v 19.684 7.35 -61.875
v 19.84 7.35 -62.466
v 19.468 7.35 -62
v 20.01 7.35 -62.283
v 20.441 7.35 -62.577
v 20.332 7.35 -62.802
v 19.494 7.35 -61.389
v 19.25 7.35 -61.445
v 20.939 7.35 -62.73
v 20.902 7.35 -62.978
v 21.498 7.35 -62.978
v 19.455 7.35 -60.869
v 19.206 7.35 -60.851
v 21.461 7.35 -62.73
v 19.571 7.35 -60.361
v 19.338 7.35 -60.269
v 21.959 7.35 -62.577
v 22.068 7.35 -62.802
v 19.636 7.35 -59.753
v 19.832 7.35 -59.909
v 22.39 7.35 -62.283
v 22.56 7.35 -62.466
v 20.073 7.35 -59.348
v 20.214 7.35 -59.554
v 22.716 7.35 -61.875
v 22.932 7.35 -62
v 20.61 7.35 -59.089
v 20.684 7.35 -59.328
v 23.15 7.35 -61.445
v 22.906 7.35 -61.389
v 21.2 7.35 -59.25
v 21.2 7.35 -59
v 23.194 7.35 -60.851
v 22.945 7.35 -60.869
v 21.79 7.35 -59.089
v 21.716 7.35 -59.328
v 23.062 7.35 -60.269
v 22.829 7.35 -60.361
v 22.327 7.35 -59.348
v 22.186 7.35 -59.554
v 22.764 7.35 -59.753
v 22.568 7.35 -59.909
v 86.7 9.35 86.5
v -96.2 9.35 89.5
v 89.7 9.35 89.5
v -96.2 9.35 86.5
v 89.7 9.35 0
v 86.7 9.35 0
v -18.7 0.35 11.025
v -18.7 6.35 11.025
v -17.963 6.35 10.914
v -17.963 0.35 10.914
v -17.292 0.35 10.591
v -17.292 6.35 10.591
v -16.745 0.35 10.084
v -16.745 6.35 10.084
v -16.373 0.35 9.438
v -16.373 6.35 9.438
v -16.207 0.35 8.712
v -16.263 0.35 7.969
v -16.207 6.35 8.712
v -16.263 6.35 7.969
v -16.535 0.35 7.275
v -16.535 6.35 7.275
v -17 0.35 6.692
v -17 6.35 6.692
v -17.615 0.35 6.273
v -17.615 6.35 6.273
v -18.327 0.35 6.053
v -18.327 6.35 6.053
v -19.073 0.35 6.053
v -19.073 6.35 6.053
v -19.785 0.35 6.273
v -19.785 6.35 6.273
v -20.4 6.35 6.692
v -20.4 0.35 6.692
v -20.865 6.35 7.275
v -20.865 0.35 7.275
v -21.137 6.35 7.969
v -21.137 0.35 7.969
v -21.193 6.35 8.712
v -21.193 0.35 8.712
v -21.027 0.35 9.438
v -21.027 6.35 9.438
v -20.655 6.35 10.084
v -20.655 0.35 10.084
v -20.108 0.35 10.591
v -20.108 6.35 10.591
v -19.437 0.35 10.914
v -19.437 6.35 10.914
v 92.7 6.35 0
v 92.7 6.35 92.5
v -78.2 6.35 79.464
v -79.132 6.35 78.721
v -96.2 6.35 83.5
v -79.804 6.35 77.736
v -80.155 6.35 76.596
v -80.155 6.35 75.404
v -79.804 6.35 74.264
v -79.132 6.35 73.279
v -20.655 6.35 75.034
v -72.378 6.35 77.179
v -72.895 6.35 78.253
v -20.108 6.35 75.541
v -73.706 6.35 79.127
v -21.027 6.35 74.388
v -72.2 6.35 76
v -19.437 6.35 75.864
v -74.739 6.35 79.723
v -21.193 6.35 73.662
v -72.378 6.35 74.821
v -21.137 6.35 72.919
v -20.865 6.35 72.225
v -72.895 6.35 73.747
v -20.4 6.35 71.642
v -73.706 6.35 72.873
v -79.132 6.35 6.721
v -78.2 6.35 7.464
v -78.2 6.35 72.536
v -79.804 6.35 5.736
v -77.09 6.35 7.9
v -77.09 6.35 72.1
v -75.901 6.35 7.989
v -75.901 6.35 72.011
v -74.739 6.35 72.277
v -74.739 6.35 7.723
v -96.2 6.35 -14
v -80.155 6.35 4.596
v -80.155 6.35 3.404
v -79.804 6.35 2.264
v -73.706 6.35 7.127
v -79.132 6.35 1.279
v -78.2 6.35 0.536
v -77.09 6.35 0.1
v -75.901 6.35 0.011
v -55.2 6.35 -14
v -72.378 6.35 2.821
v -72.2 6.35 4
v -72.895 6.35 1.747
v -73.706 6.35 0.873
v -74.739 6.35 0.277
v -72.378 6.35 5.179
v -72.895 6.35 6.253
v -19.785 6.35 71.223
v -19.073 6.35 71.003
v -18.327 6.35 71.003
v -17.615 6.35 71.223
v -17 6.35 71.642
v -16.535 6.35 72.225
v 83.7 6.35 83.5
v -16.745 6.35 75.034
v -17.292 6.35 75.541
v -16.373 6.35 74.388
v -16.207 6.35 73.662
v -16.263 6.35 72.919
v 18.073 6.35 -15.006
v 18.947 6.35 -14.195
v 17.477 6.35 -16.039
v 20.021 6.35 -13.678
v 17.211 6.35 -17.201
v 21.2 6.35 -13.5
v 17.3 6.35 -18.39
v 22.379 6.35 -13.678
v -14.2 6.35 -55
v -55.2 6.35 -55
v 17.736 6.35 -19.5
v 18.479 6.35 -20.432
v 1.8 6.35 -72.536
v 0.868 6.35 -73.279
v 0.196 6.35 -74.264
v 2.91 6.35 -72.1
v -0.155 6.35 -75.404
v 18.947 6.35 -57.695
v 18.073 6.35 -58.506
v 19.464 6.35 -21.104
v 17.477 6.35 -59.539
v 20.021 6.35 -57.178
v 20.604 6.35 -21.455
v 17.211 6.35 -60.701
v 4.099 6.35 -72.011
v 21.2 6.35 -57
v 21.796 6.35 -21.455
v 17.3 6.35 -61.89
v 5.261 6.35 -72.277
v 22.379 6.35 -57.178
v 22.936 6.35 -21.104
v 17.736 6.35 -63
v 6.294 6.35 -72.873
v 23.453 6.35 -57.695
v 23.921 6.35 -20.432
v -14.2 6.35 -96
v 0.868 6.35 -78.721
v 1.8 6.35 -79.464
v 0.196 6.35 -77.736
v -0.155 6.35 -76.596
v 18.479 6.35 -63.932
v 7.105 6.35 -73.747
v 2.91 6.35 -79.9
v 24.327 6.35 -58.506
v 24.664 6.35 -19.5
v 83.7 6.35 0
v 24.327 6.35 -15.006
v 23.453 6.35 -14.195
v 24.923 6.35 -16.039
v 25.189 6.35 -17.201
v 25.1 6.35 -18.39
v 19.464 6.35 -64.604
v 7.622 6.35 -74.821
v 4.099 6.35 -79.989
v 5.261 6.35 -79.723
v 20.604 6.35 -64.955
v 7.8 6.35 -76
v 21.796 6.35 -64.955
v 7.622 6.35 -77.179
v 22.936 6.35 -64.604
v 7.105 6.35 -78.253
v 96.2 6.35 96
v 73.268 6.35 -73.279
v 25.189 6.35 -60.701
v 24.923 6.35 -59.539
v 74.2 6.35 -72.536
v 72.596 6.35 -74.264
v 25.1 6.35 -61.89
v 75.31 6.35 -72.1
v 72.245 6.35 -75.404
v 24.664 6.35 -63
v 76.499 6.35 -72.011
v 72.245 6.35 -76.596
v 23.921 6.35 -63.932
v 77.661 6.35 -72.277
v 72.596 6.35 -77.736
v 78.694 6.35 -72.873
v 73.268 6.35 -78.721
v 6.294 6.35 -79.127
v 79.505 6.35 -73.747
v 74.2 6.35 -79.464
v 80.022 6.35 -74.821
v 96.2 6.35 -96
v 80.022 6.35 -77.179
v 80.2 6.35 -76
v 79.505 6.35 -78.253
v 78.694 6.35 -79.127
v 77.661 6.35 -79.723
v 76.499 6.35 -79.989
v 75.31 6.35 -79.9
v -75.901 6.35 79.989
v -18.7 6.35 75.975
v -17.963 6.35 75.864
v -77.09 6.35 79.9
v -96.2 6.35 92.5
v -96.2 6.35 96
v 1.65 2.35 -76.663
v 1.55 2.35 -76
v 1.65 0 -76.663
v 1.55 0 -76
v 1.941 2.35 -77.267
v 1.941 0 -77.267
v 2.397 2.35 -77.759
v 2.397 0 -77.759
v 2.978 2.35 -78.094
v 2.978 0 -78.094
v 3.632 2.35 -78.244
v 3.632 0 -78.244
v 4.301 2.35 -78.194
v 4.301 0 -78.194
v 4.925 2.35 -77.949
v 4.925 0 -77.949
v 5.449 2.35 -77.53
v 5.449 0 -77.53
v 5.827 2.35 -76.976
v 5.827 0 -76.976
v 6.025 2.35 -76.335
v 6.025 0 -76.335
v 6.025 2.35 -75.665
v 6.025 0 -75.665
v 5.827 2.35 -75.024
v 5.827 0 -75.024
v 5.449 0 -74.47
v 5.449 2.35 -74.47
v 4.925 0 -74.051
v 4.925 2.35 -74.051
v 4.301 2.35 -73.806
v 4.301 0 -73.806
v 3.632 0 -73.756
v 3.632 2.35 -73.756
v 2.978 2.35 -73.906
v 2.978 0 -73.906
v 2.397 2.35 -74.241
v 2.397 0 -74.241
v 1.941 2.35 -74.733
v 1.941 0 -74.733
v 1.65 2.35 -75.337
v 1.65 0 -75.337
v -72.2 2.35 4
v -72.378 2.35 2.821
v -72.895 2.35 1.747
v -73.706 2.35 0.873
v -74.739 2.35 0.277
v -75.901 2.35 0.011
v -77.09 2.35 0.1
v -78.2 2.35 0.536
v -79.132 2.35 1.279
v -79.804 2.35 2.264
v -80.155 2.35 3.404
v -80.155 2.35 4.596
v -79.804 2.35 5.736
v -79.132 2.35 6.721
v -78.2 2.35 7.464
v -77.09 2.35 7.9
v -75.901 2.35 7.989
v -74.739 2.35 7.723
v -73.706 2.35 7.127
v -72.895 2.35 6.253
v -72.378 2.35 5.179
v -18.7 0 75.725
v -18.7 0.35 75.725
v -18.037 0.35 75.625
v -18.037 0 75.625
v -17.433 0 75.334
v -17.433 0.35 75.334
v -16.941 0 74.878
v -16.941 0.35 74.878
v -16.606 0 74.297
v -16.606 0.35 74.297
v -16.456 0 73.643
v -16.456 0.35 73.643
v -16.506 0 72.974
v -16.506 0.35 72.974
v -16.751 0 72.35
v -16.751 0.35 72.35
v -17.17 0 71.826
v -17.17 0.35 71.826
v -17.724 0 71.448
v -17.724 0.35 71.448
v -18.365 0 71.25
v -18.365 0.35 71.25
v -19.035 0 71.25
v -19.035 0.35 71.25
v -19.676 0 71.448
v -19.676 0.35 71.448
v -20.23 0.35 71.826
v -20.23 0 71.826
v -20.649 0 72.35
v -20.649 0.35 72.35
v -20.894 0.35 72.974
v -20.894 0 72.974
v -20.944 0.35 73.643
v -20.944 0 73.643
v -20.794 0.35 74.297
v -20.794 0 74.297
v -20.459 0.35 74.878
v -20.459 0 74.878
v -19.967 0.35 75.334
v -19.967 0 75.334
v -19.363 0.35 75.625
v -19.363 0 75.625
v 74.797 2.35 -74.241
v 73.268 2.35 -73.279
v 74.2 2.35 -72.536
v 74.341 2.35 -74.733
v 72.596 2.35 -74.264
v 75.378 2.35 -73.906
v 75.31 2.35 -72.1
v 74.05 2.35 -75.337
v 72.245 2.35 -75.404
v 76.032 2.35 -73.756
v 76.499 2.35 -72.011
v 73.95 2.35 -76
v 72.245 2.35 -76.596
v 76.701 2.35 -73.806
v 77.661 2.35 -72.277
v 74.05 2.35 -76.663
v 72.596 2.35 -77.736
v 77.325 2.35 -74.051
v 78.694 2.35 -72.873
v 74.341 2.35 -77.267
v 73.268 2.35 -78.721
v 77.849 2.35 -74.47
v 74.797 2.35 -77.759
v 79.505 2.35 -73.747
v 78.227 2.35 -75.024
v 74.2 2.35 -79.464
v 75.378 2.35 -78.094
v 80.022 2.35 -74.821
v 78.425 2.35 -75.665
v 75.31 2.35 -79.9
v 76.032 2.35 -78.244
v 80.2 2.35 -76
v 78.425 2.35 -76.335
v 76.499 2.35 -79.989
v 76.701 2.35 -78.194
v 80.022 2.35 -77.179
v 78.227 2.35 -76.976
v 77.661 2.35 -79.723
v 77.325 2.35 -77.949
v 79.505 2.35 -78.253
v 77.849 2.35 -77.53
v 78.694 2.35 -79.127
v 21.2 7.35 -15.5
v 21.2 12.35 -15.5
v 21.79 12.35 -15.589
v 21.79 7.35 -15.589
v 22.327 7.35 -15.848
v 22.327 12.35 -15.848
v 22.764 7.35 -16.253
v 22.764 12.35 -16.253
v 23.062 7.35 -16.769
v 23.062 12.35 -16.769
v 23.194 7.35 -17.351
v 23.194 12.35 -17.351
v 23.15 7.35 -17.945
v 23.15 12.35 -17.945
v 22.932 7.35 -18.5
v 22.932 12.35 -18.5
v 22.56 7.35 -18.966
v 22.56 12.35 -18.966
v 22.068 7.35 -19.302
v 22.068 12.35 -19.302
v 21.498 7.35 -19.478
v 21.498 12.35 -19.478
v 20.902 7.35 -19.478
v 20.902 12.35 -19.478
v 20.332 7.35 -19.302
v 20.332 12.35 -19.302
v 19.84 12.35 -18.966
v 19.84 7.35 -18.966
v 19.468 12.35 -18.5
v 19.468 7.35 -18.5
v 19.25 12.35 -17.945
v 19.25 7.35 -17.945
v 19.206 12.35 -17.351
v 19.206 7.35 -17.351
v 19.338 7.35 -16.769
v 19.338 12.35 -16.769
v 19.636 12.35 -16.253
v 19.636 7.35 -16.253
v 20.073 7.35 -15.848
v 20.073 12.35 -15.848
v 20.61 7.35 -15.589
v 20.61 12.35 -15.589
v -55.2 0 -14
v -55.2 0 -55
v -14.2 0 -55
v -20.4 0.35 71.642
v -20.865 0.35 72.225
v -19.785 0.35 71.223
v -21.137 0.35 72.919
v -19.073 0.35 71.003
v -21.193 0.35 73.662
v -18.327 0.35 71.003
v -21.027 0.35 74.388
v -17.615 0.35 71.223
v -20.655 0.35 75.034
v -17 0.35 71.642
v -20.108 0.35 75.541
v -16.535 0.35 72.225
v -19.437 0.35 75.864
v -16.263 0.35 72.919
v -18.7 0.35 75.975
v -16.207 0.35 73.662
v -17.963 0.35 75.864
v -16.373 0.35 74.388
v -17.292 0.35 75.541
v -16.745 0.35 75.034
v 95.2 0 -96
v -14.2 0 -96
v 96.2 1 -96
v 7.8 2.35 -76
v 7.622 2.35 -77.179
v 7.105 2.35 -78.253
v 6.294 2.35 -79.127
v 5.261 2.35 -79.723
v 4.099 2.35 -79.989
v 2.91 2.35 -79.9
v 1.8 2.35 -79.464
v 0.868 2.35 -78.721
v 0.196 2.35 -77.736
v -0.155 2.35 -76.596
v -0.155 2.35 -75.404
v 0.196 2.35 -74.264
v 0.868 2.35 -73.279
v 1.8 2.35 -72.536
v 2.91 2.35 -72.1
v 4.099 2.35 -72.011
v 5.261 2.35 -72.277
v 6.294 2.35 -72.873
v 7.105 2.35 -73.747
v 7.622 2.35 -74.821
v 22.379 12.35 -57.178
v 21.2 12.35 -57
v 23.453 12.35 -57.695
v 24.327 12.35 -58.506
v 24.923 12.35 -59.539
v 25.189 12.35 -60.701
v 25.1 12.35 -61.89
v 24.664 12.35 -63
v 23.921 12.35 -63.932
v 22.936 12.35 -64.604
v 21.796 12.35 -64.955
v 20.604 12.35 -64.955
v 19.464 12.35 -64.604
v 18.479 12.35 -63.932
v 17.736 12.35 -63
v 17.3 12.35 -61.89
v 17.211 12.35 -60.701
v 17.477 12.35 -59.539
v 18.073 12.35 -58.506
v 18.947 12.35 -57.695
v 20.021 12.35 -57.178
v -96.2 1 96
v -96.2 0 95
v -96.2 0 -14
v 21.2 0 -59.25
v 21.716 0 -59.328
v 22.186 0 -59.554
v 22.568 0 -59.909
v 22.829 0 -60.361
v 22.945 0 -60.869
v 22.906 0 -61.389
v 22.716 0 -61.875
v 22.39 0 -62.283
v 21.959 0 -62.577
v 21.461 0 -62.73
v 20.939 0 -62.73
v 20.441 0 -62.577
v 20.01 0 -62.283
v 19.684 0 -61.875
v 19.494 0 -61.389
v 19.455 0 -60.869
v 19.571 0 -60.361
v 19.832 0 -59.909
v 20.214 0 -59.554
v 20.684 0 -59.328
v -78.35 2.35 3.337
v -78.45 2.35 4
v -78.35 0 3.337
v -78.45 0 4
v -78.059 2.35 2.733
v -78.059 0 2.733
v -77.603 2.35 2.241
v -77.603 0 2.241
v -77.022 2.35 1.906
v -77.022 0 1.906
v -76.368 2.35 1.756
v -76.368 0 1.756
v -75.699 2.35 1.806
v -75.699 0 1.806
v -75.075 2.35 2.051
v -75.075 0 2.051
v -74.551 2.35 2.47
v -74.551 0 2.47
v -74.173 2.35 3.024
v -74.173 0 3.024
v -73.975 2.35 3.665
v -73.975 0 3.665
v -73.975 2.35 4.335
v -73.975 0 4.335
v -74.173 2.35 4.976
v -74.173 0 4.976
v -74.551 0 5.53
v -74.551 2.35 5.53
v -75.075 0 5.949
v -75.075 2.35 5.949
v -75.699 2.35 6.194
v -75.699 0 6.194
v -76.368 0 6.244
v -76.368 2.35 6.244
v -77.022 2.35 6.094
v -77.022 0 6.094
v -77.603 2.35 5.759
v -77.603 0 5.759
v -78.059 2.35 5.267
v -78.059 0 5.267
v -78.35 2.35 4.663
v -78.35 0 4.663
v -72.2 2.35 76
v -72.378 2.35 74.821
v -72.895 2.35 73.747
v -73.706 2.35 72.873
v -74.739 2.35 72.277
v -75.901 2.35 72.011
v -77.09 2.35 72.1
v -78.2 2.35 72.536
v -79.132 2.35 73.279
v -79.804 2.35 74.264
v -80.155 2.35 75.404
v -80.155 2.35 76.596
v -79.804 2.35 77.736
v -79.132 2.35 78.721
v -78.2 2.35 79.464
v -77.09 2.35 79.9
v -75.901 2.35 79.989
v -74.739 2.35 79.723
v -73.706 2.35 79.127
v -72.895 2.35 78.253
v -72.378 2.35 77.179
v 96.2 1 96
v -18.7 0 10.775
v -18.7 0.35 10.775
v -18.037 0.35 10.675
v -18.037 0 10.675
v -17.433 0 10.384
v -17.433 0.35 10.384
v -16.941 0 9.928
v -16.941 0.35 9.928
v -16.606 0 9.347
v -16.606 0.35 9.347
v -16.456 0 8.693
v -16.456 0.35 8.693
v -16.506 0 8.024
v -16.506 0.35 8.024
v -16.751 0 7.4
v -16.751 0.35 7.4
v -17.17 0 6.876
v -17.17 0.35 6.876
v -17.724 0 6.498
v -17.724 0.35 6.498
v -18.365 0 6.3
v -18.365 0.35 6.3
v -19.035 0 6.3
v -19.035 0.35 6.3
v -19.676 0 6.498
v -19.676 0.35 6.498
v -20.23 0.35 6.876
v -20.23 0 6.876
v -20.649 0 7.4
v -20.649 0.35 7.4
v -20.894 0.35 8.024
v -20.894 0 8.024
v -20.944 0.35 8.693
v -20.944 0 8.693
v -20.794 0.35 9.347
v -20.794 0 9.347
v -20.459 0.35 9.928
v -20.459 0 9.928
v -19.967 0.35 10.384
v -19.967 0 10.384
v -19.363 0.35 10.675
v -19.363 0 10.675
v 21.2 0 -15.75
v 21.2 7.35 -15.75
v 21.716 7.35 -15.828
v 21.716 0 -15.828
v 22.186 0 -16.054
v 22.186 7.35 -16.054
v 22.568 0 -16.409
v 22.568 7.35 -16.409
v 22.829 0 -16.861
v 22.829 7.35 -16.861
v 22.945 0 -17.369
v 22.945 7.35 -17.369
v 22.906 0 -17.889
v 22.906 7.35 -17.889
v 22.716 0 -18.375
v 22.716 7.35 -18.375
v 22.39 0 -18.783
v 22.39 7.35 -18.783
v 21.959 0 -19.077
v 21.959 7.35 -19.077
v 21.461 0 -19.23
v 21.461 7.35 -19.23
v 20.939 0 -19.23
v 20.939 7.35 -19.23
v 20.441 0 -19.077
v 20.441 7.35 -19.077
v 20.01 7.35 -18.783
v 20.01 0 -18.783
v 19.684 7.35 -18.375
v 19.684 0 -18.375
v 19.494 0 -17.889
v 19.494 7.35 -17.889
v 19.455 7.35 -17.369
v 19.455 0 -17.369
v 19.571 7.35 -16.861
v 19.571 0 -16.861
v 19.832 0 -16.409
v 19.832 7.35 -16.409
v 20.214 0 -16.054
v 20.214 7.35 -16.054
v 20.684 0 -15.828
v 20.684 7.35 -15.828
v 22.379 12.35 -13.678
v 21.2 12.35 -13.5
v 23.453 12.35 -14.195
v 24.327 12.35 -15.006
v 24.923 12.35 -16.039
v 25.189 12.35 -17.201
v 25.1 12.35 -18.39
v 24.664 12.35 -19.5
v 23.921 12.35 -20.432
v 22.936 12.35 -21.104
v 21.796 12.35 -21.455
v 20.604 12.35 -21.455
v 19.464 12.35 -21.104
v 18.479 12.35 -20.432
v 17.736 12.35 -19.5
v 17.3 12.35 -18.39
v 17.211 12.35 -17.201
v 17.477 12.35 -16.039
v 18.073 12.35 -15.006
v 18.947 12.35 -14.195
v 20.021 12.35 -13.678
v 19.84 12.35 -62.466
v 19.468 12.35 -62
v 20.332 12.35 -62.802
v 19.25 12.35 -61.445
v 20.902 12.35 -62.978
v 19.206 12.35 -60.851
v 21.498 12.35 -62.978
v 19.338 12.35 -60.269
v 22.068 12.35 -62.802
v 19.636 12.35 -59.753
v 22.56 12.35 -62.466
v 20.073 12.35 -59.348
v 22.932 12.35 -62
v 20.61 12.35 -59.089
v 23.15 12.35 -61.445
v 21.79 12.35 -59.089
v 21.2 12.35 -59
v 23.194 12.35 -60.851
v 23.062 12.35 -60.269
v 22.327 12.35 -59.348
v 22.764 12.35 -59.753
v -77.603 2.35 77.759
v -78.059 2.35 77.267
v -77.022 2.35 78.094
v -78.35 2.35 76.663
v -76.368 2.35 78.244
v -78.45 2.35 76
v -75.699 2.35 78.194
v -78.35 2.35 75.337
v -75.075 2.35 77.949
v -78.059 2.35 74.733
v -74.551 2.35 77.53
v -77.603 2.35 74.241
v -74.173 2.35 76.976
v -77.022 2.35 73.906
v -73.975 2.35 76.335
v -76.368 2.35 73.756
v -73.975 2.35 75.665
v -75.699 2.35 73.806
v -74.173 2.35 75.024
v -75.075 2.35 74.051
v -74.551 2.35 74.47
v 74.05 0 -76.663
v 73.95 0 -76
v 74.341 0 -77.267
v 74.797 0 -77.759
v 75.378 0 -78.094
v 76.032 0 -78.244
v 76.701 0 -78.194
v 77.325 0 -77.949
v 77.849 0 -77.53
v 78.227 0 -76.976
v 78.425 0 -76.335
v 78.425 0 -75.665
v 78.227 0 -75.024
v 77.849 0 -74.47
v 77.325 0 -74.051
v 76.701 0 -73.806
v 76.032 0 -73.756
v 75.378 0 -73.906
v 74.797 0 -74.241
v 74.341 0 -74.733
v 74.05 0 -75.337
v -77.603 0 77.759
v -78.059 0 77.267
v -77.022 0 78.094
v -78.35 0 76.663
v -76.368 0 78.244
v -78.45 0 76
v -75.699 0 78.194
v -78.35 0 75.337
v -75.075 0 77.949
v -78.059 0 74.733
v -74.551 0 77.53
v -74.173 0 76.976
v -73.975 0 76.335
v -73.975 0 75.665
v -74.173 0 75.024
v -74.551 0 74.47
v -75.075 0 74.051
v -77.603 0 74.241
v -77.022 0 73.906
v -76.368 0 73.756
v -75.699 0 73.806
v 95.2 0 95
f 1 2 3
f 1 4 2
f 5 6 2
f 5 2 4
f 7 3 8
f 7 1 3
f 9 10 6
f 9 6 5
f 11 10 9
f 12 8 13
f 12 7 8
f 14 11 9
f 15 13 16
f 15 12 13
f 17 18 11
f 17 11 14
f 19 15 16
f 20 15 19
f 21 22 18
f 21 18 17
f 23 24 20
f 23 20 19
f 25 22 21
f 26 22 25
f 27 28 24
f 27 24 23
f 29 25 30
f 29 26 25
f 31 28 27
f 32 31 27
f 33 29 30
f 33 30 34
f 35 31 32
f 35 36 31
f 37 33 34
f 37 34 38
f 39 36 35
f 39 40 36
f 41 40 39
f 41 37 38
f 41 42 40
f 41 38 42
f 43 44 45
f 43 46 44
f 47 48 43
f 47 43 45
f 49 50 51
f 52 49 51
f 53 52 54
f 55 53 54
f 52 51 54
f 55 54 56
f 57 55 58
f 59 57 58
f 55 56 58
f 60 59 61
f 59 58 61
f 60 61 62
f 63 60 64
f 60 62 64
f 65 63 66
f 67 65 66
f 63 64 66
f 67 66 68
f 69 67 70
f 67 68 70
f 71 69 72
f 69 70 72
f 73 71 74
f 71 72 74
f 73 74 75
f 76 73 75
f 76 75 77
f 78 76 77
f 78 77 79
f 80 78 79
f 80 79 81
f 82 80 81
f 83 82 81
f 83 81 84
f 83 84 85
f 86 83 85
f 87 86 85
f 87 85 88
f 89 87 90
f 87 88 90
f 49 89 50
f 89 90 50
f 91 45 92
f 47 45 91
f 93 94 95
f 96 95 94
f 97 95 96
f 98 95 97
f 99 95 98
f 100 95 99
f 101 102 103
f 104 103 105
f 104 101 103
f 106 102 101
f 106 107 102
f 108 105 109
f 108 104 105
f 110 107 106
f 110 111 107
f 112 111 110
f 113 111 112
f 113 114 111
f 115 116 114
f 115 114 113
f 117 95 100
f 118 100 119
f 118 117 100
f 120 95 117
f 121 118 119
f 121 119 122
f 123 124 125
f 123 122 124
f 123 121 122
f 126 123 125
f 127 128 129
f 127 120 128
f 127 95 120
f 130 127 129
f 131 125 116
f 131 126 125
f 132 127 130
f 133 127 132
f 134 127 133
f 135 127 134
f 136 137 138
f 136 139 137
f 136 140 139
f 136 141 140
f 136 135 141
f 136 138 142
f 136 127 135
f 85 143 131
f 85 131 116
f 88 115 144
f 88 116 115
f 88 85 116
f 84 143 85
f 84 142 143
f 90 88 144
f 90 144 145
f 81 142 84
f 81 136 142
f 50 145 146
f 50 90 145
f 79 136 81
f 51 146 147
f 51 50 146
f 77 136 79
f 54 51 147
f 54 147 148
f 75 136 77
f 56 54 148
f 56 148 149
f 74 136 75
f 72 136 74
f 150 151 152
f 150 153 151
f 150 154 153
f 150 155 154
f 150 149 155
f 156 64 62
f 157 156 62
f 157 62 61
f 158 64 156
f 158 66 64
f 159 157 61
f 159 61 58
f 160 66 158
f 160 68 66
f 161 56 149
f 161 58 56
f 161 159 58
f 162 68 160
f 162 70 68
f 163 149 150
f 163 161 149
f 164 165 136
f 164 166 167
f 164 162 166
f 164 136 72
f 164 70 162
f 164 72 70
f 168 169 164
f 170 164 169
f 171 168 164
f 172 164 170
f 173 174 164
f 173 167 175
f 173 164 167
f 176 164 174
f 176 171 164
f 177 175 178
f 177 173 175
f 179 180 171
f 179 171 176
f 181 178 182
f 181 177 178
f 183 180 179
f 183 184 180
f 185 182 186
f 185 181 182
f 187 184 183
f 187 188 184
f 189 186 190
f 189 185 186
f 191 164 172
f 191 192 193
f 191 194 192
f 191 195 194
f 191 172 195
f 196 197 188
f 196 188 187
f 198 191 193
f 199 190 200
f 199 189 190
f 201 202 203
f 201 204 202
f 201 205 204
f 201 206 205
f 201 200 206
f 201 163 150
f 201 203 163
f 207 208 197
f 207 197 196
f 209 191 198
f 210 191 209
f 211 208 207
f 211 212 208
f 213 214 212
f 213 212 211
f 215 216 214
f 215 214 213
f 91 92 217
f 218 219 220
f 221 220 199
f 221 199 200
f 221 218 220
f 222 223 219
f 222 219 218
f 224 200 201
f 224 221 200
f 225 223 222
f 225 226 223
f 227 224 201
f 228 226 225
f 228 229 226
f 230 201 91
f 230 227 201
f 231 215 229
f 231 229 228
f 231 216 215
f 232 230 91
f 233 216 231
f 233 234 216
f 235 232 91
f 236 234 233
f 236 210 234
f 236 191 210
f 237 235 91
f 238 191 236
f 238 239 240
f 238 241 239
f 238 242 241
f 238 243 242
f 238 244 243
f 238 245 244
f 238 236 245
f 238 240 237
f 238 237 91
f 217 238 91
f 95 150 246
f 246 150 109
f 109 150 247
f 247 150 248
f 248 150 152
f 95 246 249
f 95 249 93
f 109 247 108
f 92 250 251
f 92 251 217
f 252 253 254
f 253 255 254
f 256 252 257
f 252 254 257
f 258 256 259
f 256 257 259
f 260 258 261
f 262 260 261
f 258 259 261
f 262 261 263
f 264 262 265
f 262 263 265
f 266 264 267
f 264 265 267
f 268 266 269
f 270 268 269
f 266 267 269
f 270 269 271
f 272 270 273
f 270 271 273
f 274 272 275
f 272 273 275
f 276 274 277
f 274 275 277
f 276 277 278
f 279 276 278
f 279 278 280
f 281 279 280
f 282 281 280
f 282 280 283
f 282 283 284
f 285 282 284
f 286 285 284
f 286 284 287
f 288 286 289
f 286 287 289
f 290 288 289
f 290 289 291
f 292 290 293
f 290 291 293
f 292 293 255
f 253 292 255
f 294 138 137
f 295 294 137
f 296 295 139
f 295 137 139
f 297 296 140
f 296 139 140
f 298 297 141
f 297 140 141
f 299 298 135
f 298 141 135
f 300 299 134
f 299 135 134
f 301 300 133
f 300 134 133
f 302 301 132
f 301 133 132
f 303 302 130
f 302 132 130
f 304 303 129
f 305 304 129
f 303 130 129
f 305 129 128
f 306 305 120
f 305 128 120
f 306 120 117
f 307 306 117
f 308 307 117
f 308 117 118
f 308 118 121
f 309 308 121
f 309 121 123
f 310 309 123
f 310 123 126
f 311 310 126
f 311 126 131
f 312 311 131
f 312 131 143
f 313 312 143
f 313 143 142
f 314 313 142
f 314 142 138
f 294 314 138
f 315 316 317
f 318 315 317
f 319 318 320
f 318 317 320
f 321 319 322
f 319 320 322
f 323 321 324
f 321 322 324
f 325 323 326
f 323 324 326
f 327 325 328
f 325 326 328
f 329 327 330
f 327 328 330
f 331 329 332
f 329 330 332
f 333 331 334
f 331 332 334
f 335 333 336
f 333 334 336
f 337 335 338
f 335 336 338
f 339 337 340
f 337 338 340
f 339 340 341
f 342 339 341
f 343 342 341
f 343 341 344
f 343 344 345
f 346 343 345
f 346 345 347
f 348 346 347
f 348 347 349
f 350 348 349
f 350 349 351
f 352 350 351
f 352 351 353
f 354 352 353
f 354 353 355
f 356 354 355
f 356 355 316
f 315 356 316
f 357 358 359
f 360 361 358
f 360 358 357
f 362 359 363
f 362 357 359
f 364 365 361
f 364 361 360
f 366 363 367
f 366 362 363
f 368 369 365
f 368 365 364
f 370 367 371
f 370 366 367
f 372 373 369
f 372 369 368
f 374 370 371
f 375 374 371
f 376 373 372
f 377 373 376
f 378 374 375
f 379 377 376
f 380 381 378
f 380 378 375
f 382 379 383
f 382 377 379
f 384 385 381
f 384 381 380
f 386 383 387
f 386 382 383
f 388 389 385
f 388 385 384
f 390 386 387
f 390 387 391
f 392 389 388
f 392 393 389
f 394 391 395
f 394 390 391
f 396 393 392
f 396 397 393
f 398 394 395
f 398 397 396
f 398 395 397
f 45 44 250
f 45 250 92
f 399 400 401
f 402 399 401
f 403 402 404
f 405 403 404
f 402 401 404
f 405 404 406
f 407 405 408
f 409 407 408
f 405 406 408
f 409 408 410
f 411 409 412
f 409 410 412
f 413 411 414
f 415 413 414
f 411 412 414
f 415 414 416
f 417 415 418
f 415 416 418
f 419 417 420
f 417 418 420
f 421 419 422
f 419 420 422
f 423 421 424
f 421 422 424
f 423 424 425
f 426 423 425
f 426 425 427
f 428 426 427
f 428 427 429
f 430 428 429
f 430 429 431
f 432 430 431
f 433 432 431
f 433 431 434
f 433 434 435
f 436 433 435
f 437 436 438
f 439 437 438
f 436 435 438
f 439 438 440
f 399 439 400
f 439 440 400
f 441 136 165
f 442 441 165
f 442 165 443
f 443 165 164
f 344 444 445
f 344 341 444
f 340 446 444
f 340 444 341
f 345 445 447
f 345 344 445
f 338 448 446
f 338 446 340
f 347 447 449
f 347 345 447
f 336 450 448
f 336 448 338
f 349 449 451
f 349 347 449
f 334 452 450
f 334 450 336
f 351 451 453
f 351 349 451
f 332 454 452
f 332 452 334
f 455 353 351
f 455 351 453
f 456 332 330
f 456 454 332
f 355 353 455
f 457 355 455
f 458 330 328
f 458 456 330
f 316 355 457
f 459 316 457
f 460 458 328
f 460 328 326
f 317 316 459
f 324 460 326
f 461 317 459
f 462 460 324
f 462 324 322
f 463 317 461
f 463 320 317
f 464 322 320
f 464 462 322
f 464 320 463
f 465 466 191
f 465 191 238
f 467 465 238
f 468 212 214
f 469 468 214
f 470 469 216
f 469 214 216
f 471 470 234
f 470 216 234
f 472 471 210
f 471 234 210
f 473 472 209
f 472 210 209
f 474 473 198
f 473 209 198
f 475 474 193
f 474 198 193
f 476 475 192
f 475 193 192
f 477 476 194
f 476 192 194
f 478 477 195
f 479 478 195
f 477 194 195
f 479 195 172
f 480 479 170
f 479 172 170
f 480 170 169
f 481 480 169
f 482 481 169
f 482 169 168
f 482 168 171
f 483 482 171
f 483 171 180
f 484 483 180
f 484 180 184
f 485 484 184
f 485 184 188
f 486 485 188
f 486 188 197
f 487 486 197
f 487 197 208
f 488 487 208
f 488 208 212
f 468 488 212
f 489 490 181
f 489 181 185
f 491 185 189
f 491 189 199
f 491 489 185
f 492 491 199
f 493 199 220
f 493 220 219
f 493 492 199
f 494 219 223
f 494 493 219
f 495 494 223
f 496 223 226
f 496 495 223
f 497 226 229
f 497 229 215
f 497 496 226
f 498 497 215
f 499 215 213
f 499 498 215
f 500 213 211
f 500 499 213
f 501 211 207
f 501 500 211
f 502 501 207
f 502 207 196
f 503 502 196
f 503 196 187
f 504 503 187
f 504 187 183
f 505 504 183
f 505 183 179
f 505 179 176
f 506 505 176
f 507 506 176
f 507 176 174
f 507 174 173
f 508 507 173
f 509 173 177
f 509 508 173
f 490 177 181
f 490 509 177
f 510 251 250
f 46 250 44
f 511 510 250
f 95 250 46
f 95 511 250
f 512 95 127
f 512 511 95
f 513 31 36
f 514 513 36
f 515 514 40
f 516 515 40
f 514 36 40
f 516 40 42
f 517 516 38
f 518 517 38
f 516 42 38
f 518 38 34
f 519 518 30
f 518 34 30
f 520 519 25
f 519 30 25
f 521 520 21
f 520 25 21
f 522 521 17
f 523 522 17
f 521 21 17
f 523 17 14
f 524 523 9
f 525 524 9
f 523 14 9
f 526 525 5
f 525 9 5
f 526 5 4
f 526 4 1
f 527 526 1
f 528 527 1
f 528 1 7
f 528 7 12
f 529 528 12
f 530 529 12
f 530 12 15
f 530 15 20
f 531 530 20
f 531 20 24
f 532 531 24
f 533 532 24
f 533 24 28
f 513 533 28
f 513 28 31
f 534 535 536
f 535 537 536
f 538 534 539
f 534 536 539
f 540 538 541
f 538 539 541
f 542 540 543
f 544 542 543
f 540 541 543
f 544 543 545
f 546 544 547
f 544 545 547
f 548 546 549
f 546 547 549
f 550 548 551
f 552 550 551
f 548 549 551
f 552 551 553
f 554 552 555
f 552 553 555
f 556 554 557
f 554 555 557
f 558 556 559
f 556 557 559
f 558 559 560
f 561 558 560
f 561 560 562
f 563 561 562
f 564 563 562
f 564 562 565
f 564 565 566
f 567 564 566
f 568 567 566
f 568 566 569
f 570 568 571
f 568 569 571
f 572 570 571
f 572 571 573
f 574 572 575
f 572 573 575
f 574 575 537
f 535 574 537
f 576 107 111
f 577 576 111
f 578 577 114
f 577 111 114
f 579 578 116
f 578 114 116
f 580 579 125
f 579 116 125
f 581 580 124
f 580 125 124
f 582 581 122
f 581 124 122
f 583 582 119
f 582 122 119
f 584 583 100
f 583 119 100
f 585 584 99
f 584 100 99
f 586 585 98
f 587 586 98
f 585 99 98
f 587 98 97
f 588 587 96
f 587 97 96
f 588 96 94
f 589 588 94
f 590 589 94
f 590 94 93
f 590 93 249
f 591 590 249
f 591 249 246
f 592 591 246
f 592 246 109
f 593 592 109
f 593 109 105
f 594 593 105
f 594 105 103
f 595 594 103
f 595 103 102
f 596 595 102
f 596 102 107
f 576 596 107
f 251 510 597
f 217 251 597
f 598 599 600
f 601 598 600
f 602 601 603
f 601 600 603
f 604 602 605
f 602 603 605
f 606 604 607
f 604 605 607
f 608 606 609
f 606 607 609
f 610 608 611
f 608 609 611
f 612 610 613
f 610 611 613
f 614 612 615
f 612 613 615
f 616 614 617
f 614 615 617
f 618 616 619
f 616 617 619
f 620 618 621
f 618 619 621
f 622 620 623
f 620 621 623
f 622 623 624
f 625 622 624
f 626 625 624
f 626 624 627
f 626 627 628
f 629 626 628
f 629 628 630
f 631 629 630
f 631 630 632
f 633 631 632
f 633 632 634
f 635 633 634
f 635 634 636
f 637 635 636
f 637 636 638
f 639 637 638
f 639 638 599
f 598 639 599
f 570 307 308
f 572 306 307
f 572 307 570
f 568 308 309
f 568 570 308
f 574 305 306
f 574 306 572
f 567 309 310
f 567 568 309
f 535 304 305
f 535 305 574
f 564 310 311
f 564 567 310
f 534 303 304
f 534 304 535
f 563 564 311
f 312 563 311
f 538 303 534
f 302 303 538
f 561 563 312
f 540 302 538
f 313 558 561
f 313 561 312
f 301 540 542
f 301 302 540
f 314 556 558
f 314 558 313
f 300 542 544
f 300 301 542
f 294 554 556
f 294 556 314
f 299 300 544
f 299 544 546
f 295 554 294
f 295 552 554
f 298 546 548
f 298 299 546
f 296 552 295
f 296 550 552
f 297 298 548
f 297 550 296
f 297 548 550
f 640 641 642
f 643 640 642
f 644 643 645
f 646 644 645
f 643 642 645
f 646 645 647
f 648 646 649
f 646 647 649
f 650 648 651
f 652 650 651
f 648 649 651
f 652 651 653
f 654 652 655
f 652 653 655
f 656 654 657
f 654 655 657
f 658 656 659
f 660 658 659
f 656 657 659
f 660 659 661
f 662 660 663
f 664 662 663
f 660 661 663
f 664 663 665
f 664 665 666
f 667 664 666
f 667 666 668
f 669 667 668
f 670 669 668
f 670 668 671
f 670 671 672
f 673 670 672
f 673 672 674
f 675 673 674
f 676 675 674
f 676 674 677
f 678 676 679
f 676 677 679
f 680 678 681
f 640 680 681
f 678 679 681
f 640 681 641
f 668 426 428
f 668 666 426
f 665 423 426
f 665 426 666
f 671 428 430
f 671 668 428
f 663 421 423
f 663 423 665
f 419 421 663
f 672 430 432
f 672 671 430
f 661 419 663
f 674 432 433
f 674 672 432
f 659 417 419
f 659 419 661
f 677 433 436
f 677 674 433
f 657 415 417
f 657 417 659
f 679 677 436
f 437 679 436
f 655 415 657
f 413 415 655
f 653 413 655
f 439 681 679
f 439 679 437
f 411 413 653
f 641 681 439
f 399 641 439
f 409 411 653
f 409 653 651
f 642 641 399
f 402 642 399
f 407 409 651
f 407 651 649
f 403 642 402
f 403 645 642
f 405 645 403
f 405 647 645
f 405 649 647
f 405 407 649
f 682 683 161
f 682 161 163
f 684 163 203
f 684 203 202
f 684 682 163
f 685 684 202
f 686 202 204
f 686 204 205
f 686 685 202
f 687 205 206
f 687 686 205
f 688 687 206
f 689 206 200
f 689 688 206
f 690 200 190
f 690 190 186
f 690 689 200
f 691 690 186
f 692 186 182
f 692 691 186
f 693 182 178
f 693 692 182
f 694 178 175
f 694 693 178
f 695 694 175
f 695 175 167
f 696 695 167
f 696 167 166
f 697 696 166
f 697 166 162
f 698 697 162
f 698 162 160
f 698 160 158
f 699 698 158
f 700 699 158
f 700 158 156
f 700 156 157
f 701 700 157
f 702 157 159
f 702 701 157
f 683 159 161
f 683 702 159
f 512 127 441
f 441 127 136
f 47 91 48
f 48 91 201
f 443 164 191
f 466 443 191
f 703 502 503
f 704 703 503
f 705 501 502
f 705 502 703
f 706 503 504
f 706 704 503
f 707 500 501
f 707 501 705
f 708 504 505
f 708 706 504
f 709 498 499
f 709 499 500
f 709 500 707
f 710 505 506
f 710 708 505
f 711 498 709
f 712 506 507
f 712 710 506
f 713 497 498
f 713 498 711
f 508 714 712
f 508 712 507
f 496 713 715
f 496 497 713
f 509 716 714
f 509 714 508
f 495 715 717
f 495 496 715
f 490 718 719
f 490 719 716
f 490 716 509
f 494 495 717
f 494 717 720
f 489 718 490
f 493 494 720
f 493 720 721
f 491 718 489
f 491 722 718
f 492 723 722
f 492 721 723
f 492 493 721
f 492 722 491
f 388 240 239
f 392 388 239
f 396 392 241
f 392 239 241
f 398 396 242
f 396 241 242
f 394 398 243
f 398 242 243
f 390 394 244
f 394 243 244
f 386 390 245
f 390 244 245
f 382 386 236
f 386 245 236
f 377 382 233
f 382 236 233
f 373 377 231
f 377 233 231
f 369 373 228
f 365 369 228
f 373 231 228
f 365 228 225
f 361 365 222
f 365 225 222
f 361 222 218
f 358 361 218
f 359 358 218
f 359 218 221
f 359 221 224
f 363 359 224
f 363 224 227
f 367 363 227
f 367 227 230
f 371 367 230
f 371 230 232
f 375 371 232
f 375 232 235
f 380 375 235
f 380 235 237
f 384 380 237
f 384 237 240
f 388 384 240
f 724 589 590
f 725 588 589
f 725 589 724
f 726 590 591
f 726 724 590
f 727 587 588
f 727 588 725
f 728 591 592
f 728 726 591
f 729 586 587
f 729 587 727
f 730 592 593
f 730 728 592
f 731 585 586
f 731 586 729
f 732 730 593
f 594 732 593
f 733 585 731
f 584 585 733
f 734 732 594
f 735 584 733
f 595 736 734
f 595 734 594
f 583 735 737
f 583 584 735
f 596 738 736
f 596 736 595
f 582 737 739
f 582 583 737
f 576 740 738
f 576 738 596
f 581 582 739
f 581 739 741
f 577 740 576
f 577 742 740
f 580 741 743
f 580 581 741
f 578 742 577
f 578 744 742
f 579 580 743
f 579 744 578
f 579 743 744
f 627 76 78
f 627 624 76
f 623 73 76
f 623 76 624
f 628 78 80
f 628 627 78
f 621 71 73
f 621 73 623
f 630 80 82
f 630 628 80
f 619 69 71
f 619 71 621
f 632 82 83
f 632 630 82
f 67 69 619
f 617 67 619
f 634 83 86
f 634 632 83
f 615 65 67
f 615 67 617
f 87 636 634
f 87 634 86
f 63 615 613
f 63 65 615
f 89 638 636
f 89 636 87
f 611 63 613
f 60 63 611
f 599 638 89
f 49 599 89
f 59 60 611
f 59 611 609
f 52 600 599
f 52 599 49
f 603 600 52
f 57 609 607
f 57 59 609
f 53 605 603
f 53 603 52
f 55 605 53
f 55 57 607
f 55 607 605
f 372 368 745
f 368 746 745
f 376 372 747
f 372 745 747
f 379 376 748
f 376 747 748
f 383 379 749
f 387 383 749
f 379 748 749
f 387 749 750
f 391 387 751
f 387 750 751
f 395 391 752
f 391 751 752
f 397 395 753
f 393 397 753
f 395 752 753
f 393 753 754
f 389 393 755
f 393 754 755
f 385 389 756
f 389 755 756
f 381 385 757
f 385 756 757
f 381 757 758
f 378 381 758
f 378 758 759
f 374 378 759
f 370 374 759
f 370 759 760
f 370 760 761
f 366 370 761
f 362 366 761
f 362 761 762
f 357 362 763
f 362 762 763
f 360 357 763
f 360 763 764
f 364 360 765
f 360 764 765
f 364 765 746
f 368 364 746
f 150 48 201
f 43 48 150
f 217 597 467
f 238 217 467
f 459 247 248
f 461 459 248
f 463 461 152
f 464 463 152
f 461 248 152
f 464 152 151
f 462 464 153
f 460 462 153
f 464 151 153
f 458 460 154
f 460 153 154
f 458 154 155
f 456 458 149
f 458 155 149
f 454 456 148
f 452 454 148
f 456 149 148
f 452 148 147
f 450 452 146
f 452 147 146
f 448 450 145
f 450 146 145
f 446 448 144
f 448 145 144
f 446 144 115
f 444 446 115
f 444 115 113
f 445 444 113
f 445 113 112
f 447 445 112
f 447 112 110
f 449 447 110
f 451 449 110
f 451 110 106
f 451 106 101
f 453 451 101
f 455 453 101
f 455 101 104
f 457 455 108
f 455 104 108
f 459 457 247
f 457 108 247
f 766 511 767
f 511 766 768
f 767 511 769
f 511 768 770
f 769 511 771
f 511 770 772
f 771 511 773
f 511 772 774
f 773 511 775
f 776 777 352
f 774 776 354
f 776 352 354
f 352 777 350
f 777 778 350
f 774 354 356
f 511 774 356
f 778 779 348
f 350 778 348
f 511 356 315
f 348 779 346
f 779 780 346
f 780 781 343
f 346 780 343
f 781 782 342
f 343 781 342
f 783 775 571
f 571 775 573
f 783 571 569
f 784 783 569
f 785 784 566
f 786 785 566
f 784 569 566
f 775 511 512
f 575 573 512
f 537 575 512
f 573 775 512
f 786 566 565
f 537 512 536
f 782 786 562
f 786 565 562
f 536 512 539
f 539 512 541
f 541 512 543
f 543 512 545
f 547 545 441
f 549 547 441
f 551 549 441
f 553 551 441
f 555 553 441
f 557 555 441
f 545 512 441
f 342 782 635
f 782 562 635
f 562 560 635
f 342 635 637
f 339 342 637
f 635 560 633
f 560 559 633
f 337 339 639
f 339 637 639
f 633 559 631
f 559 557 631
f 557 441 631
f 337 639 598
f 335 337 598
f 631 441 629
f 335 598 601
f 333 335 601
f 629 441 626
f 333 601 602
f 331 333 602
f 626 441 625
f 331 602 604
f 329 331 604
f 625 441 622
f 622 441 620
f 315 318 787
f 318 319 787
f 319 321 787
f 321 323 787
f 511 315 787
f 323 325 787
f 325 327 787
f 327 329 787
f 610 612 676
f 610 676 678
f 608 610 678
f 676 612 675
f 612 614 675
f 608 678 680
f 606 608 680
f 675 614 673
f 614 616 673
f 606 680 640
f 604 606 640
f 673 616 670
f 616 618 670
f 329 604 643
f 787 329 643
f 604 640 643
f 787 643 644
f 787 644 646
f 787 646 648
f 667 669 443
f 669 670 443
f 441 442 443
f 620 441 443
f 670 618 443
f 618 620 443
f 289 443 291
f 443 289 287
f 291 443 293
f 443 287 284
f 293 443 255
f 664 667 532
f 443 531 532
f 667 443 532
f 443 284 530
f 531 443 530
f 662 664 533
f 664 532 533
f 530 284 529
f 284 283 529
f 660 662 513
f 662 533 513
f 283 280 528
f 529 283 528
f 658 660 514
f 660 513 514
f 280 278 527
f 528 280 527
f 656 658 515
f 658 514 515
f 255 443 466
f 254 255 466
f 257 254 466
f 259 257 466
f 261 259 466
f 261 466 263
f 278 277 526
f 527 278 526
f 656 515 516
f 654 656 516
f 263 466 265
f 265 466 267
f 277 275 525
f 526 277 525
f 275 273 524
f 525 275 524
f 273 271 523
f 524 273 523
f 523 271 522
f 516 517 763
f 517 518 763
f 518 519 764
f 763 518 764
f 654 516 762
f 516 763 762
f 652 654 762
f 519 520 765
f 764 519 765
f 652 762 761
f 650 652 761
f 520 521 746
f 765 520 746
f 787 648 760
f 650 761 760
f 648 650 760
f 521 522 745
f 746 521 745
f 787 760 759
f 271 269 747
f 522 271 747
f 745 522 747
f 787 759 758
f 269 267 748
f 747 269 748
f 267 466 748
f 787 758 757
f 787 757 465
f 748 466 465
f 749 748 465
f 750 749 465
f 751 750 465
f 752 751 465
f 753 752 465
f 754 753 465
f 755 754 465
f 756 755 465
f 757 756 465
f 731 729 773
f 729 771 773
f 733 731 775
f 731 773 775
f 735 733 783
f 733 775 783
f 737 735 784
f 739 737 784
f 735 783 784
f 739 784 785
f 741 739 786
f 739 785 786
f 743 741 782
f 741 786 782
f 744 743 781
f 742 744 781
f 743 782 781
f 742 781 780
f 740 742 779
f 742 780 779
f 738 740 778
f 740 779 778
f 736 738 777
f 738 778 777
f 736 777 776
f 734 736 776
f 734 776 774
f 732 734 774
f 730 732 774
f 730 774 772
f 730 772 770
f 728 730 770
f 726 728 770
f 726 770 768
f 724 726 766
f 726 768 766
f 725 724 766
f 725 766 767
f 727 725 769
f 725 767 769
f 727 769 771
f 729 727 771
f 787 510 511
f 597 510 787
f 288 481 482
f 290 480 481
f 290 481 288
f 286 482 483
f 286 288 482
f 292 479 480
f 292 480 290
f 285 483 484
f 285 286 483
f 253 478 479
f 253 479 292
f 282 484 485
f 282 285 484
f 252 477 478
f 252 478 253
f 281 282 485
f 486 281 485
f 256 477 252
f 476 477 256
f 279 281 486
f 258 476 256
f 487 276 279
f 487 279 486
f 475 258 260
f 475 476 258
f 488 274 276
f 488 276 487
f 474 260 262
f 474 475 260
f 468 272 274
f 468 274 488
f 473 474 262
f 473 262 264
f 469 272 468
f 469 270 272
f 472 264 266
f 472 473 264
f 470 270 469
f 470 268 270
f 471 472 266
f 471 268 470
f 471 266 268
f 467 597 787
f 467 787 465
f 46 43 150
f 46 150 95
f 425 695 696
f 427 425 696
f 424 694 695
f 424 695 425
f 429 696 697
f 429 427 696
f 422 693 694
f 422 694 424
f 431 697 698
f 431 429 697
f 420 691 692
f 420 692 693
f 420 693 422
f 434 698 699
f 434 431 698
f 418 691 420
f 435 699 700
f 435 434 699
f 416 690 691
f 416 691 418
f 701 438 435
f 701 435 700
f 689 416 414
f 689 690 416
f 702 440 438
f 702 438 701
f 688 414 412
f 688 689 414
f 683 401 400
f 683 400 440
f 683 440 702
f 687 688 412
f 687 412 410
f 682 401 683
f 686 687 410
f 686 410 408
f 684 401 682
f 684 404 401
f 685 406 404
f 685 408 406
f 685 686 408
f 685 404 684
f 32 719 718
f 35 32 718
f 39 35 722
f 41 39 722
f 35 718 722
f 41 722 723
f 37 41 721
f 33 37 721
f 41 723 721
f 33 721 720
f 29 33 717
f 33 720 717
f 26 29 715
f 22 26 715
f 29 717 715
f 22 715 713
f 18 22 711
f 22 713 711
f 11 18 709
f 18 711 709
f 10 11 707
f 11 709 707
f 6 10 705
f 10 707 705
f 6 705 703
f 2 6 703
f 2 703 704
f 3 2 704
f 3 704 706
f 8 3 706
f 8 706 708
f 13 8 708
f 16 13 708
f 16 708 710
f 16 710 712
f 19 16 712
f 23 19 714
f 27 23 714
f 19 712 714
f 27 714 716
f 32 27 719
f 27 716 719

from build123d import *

# Parameters (mm, degrees)
SKETCH1_W                      = 192.4
SKETCH1_H                      = 192
BOSS_EXTRUDE1_DEPTH            = 6.35
CUT_EXTRUDE1_REACH             = 138.054
SKETCH2_W                      = 41
SKETCH2_H                      = 41
CBORE_FOR_M4_SHCS1_D           = 4.5
CBORE_FOR_M4_SHCS1_CBORE_D     = 8
CBORE_FOR_M4_SHCS1_CBORE_DEPTH = 4
SKETCH5_R                      = 2.5
CUT_EXTRUDE2_DEPTH             = 6
CUT_EXTRUDE3_REACH             = 138.038
SKETCH6_R                      = 2.25
CUT_EXTRUDE4_REACH             = 138.054
SKETCH7_R                      = 1.75
BOSS_EXTRUDE2_START            = 6
SKETCH11_R                     = 4
SKETCH11_R_2                   = 1.75
BOSS_EXTRUDE2_DEPTH            = 6
SKETCH8_R                      = 2
CUT_EXTRUDE5_DEPTH             = 5
EXTRUDE_THIN1_DEPTH            = 3
CHAMFER1_SIZE                  = 3
CHAMFER2_SIZE                  = 1


with BuildPart() as part:
    # Sketch1 → Boss-Extrude1 (new body)
    with BuildSketch(Plane(origin=(0, 0, 0), x_dir=(1, 0, 0), z_dir=(0, 1, 0))):
        Rectangle(SKETCH1_W, SKETCH1_H)
    extrude(amount=BOSS_EXTRUDE1_DEPTH)

    # Sketch2 → Cut-Extrude1 (cut, up to next)
    with BuildSketch(Plane(origin=(0, 6.35, 0), x_dir=(1, 0, 0), z_dir=(0, 1, 0)), mode=Mode.PRIVATE) as cut_extrude1_sk1:
        with Locations((-75.7, 34.5)):
            Rectangle(SKETCH2_W, SKETCH2_H)
    cut_extrude1_tool1 = extrude(cut_extrude1_sk1.sketch, amount=-CUT_EXTRUDE1_REACH, mode=Mode.PRIVATE) & part.part
    # Sketch2 → Cut-Extrude1 (cut, up to next)
    with BuildSketch(Plane(origin=(0, 6.35, 0), x_dir=(1, 0, 0), z_dir=(0, 1, 0)), mode=Mode.PRIVATE) as cut_extrude1_sk2:
        with Locations((-75.7, 75.5)):
            Rectangle(SKETCH2_W, SKETCH2_H)
    cut_extrude1_tool2 = extrude(cut_extrude1_sk2.sketch, amount=-CUT_EXTRUDE1_REACH, mode=Mode.PRIVATE) & part.part
    # Sketch2 → Cut-Extrude1 (cut, up to next)
    with BuildSketch(Plane(origin=(0, 6.35, 0), x_dir=(1, 0, 0), z_dir=(0, 1, 0)), mode=Mode.PRIVATE) as cut_extrude1_sk3:
        with Locations((-34.7, 75.5)):
            Rectangle(SKETCH2_W, SKETCH2_H)
    cut_extrude1_tool3 = extrude(cut_extrude1_sk3.sketch, amount=-CUT_EXTRUDE1_REACH, mode=Mode.PRIVATE) & part.part
    add(cut_extrude1_tool1.solids().sort_by_distance((-75.7, 6.35, -34.5))[0], mode=Mode.SUBTRACT)
    add(cut_extrude1_tool2.solids().sort_by_distance((-75.7, 6.35, -75.5))[0], mode=Mode.SUBTRACT)
    add(cut_extrude1_tool3.solids().sort_by_distance((-34.7, 6.35, -75.5))[0], mode=Mode.SUBTRACT)

    # CBORE for M4 SHCS1 (through all)
    with Locations(Plane(origin=(0, 6.35, 0), x_dir=(1, 0, 0), z_dir=(0, 1, 0))):
        with Locations((76.2, 76), (-76.2, -4), (-76.2, -76), (3.8, 76)):
            CounterBoreHole(CBORE_FOR_M4_SHCS1_D / 2, CBORE_FOR_M4_SHCS1_CBORE_D / 2, CBORE_FOR_M4_SHCS1_CBORE_DEPTH)

    # Sketch5 → Cut-Extrude2 (cut)
    with BuildSketch(Plane(origin=(0, 6.35, 0), x_dir=(1, 0, 0), z_dir=(0, 1, 0))):
        with Locations(Location((-18.7, -8.525, 0), (0, 0, 270))):
            Circle(SKETCH5_R)
        with Locations(Location((-18.7, -73.475, 0), (0, 0, 270))):
            Circle(SKETCH5_R)
    extrude(amount=-CUT_EXTRUDE2_DEPTH, mode=Mode.SUBTRACT)

    # Sketch6 → Cut-Extrude3 (cut, up to next)
    with BuildSketch(Plane(origin=(0, 0.35, 0), x_dir=(1, 0, 0), z_dir=(0, 1, 0)), mode=Mode.PRIVATE) as cut_extrude3_sk1:
        with Locations(Location((-18.7, -8.525, 0), (0, 0, 270))):
            Circle(SKETCH6_R)
    cut_extrude3_tool1 = extrude(cut_extrude3_sk1.sketch, amount=-CUT_EXTRUDE3_REACH, mode=Mode.PRIVATE) & part.part
    # Sketch6 → Cut-Extrude3 (cut, up to next)
    with BuildSketch(Plane(origin=(0, 0.35, 0), x_dir=(1, 0, 0), z_dir=(0, 1, 0)), mode=Mode.PRIVATE) as cut_extrude3_sk2:
        with Locations(Location((-18.7, -73.475, 0), (0, 0, 270))):
            Circle(SKETCH6_R)
    cut_extrude3_tool2 = extrude(cut_extrude3_sk2.sketch, amount=-CUT_EXTRUDE3_REACH, mode=Mode.PRIVATE) & part.part
    add(cut_extrude3_tool1.solids().sort_by_distance((-18.7, 0.35, 8.525))[0], mode=Mode.SUBTRACT)
    add(cut_extrude3_tool2.solids().sort_by_distance((-18.7, 0.35, 73.475))[0], mode=Mode.SUBTRACT)

    # Sketch7 → Cut-Extrude4 (cut, up to next)
    with BuildSketch(Plane(origin=(0, 6.35, 0), x_dir=(1, 0, 0), z_dir=(0, 1, 0)), mode=Mode.PRIVATE) as cut_extrude4_sk1:
        with Locations(Location((21.2, 61, 0), (0, 0, 270))):
            Circle(SKETCH7_R)
    cut_extrude4_tool1 = extrude(cut_extrude4_sk1.sketch, amount=-CUT_EXTRUDE4_REACH, mode=Mode.PRIVATE) & part.part
    # Sketch7 → Cut-Extrude4 (cut, up to next)
    with BuildSketch(Plane(origin=(0, 6.35, 0), x_dir=(1, 0, 0), z_dir=(0, 1, 0)), mode=Mode.PRIVATE) as cut_extrude4_sk2:
        with Locations(Location((21.2, 17.5, 0), (0, 0, 270))):
            Circle(SKETCH7_R)
    cut_extrude4_tool2 = extrude(cut_extrude4_sk2.sketch, amount=-CUT_EXTRUDE4_REACH, mode=Mode.PRIVATE) & part.part
    add(cut_extrude4_tool1.solids().sort_by_distance((21.2, 6.35, -61))[0], mode=Mode.SUBTRACT)
    add(cut_extrude4_tool2.solids().sort_by_distance((21.2, 6.35, -17.5))[0], mode=Mode.SUBTRACT)

    # Sketch11 → Boss-Extrude2 (add)
    # profile 1 of 2: a face of its own
    with BuildSketch(Plane(origin=(0, 6.35, 0), x_dir=(1, 0, 0), z_dir=(0, 1, 0)).offset(BOSS_EXTRUDE2_START)):
        with Locations(Location((21.2, 61, 0), (0, 0, 270))):
            Circle(SKETCH11_R)
        with Locations(Location((21.2, 61, 0), (0, 0, 270))):
            Circle(SKETCH11_R_2, mode=Mode.SUBTRACT)
    # profile 2 of 2: a face of its own
    with BuildSketch(Plane(origin=(0, 6.35, 0), x_dir=(1, 0, 0), z_dir=(0, 1, 0)).offset(BOSS_EXTRUDE2_START)):
        with Locations(Location((21.2, 17.5, 0), (0, 0, 270))):
            Circle(SKETCH11_R)
        with Locations(Location((21.2, 17.5, 0), (0, 0, 270))):
            Circle(SKETCH11_R_2, mode=Mode.SUBTRACT)
    extrude(amount=-BOSS_EXTRUDE2_DEPTH)

    # Sketch8 → Cut-Extrude5 (cut)
    with BuildSketch(Plane(origin=(0, 12.35, 0), x_dir=(1, 0, 0), z_dir=(0, 1, 0))):
        with Locations(Location((21.2, 61, 0), (0, 0, 270))):
            Circle(SKETCH8_R)
        with Locations(Location((21.2, 17.5, 0), (0, 0, 270))):
            Circle(SKETCH8_R)
    extrude(amount=-CUT_EXTRUDE5_DEPTH, mode=Mode.SUBTRACT)

    # Sketch9 → Extrude-Thin1 (add)
    with BuildSketch(Plane(origin=(0, 6.35, 0), x_dir=(1, 0, 0), z_dir=(0, 1, 0))):
        Polygon((-96.2, -89.5), (89.7, -89.5), (89.7, 0), (86.7, 0), (86.7, -86.5), (-96.2, -86.5), align=None)
    extrude(amount=EXTRUDE_THIN1_DEPTH)

    # Chamfer1
    chamfer1_edges = [part.edges().sort_by_distance(p)[0] for p in [
        (-4.75, 6.35, 86.5),
        (86.7, 6.35, 43.25),
        (-3.25, 6.35, 89.5),
        (89.7, 6.35, 44.75),
    ]]
    chamfer(chamfer1_edges, length=CHAMFER1_SIZE - 0.0001)  # a hair under: the kernel refuses the full size

    # Chamfer2
    chamfer2_edges = [part.edges().sort_by_distance(p)[0] for p in [
        (0, 0, 96),
        (96.2, 0, 0),
    ]]
    chamfer(chamfer2_edges, length=CHAMFER2_SIZE)


solid = part.part
